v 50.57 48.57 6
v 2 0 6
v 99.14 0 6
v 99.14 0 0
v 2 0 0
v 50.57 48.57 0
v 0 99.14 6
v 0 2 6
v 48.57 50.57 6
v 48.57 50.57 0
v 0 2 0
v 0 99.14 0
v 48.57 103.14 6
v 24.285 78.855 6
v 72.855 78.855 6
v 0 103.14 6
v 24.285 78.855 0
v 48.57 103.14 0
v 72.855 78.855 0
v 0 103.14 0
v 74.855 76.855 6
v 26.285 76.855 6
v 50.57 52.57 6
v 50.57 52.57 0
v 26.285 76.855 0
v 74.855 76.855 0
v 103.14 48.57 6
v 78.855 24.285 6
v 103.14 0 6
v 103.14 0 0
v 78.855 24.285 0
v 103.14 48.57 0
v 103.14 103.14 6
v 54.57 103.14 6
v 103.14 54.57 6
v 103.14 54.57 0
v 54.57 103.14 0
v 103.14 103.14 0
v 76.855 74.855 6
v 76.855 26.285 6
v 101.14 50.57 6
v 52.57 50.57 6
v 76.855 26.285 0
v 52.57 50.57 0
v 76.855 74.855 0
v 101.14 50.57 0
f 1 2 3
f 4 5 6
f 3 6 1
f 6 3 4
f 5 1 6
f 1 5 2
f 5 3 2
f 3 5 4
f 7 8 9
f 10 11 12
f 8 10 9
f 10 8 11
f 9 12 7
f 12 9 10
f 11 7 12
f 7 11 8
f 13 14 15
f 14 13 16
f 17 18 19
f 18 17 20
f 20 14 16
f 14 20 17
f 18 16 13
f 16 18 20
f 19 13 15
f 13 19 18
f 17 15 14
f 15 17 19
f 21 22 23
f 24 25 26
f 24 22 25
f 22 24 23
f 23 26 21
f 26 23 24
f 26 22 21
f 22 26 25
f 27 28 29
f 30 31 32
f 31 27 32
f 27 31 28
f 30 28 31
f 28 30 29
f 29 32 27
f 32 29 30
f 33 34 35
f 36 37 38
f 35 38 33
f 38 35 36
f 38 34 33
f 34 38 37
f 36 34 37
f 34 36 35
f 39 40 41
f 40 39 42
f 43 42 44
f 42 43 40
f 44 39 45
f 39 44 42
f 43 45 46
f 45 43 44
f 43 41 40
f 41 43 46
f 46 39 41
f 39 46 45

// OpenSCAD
x = 97.14;
h = 6;
delta = 2;

a = x / sqrt(2);
b = x / (2 * sqrt(2));
c = b;
d = x / 2;
e = d;
f = x * sqrt(2) / 2;
g = x * sqrt(2) / 4;


module triangle(length) {
  difference() {
    cube([length, length, h]);
    translate([length, 0, 0]) { 
      rotate([0, 0, 45]) cube([length * sqrt(2), length * sqrt(2), h]);
    }
  }
}

module diamond(length) {
  triangle(length);
  translate([length, 0, 0]) mirror([90, 90, 0]) triangle(length);
}

module mysquare(length) {
  cube([length, length, h]);
}


union() {
  translate([x / 2 + delta, x / 2, 0]) rotate([0, 0, -135]) triangle(a);
  translate([x / 2, x / 2 + delta, 0]) rotate([0, 0, 135]) triangle(a);
  translate([g / sqrt(2), x - g / sqrt(2) + 3 * delta, 0]) rotate([0, 0, 45]) diamond(g);
  translate([x / 2 + delta, x / 2 + 2 * delta, 0]) rotate([0, 0, 45]) triangle(c);
  translate([x/ 2 + 2 * delta + b * sqrt(2) / 2, x / 2 - b * sqrt(2) / 2 + delta, 0])rotate([0, 0, 45]) mysquare(b);
  translate([x - c * sqrt(2) / 2 + 3* delta, c * sqrt(2) / 2, 0]) rotate([0, 0, -45]) triangle(c);
  translate([x + 3 * delta, x + 3 * delta, 0]) rotate([0, 0, -180]) triangle(e);
}
